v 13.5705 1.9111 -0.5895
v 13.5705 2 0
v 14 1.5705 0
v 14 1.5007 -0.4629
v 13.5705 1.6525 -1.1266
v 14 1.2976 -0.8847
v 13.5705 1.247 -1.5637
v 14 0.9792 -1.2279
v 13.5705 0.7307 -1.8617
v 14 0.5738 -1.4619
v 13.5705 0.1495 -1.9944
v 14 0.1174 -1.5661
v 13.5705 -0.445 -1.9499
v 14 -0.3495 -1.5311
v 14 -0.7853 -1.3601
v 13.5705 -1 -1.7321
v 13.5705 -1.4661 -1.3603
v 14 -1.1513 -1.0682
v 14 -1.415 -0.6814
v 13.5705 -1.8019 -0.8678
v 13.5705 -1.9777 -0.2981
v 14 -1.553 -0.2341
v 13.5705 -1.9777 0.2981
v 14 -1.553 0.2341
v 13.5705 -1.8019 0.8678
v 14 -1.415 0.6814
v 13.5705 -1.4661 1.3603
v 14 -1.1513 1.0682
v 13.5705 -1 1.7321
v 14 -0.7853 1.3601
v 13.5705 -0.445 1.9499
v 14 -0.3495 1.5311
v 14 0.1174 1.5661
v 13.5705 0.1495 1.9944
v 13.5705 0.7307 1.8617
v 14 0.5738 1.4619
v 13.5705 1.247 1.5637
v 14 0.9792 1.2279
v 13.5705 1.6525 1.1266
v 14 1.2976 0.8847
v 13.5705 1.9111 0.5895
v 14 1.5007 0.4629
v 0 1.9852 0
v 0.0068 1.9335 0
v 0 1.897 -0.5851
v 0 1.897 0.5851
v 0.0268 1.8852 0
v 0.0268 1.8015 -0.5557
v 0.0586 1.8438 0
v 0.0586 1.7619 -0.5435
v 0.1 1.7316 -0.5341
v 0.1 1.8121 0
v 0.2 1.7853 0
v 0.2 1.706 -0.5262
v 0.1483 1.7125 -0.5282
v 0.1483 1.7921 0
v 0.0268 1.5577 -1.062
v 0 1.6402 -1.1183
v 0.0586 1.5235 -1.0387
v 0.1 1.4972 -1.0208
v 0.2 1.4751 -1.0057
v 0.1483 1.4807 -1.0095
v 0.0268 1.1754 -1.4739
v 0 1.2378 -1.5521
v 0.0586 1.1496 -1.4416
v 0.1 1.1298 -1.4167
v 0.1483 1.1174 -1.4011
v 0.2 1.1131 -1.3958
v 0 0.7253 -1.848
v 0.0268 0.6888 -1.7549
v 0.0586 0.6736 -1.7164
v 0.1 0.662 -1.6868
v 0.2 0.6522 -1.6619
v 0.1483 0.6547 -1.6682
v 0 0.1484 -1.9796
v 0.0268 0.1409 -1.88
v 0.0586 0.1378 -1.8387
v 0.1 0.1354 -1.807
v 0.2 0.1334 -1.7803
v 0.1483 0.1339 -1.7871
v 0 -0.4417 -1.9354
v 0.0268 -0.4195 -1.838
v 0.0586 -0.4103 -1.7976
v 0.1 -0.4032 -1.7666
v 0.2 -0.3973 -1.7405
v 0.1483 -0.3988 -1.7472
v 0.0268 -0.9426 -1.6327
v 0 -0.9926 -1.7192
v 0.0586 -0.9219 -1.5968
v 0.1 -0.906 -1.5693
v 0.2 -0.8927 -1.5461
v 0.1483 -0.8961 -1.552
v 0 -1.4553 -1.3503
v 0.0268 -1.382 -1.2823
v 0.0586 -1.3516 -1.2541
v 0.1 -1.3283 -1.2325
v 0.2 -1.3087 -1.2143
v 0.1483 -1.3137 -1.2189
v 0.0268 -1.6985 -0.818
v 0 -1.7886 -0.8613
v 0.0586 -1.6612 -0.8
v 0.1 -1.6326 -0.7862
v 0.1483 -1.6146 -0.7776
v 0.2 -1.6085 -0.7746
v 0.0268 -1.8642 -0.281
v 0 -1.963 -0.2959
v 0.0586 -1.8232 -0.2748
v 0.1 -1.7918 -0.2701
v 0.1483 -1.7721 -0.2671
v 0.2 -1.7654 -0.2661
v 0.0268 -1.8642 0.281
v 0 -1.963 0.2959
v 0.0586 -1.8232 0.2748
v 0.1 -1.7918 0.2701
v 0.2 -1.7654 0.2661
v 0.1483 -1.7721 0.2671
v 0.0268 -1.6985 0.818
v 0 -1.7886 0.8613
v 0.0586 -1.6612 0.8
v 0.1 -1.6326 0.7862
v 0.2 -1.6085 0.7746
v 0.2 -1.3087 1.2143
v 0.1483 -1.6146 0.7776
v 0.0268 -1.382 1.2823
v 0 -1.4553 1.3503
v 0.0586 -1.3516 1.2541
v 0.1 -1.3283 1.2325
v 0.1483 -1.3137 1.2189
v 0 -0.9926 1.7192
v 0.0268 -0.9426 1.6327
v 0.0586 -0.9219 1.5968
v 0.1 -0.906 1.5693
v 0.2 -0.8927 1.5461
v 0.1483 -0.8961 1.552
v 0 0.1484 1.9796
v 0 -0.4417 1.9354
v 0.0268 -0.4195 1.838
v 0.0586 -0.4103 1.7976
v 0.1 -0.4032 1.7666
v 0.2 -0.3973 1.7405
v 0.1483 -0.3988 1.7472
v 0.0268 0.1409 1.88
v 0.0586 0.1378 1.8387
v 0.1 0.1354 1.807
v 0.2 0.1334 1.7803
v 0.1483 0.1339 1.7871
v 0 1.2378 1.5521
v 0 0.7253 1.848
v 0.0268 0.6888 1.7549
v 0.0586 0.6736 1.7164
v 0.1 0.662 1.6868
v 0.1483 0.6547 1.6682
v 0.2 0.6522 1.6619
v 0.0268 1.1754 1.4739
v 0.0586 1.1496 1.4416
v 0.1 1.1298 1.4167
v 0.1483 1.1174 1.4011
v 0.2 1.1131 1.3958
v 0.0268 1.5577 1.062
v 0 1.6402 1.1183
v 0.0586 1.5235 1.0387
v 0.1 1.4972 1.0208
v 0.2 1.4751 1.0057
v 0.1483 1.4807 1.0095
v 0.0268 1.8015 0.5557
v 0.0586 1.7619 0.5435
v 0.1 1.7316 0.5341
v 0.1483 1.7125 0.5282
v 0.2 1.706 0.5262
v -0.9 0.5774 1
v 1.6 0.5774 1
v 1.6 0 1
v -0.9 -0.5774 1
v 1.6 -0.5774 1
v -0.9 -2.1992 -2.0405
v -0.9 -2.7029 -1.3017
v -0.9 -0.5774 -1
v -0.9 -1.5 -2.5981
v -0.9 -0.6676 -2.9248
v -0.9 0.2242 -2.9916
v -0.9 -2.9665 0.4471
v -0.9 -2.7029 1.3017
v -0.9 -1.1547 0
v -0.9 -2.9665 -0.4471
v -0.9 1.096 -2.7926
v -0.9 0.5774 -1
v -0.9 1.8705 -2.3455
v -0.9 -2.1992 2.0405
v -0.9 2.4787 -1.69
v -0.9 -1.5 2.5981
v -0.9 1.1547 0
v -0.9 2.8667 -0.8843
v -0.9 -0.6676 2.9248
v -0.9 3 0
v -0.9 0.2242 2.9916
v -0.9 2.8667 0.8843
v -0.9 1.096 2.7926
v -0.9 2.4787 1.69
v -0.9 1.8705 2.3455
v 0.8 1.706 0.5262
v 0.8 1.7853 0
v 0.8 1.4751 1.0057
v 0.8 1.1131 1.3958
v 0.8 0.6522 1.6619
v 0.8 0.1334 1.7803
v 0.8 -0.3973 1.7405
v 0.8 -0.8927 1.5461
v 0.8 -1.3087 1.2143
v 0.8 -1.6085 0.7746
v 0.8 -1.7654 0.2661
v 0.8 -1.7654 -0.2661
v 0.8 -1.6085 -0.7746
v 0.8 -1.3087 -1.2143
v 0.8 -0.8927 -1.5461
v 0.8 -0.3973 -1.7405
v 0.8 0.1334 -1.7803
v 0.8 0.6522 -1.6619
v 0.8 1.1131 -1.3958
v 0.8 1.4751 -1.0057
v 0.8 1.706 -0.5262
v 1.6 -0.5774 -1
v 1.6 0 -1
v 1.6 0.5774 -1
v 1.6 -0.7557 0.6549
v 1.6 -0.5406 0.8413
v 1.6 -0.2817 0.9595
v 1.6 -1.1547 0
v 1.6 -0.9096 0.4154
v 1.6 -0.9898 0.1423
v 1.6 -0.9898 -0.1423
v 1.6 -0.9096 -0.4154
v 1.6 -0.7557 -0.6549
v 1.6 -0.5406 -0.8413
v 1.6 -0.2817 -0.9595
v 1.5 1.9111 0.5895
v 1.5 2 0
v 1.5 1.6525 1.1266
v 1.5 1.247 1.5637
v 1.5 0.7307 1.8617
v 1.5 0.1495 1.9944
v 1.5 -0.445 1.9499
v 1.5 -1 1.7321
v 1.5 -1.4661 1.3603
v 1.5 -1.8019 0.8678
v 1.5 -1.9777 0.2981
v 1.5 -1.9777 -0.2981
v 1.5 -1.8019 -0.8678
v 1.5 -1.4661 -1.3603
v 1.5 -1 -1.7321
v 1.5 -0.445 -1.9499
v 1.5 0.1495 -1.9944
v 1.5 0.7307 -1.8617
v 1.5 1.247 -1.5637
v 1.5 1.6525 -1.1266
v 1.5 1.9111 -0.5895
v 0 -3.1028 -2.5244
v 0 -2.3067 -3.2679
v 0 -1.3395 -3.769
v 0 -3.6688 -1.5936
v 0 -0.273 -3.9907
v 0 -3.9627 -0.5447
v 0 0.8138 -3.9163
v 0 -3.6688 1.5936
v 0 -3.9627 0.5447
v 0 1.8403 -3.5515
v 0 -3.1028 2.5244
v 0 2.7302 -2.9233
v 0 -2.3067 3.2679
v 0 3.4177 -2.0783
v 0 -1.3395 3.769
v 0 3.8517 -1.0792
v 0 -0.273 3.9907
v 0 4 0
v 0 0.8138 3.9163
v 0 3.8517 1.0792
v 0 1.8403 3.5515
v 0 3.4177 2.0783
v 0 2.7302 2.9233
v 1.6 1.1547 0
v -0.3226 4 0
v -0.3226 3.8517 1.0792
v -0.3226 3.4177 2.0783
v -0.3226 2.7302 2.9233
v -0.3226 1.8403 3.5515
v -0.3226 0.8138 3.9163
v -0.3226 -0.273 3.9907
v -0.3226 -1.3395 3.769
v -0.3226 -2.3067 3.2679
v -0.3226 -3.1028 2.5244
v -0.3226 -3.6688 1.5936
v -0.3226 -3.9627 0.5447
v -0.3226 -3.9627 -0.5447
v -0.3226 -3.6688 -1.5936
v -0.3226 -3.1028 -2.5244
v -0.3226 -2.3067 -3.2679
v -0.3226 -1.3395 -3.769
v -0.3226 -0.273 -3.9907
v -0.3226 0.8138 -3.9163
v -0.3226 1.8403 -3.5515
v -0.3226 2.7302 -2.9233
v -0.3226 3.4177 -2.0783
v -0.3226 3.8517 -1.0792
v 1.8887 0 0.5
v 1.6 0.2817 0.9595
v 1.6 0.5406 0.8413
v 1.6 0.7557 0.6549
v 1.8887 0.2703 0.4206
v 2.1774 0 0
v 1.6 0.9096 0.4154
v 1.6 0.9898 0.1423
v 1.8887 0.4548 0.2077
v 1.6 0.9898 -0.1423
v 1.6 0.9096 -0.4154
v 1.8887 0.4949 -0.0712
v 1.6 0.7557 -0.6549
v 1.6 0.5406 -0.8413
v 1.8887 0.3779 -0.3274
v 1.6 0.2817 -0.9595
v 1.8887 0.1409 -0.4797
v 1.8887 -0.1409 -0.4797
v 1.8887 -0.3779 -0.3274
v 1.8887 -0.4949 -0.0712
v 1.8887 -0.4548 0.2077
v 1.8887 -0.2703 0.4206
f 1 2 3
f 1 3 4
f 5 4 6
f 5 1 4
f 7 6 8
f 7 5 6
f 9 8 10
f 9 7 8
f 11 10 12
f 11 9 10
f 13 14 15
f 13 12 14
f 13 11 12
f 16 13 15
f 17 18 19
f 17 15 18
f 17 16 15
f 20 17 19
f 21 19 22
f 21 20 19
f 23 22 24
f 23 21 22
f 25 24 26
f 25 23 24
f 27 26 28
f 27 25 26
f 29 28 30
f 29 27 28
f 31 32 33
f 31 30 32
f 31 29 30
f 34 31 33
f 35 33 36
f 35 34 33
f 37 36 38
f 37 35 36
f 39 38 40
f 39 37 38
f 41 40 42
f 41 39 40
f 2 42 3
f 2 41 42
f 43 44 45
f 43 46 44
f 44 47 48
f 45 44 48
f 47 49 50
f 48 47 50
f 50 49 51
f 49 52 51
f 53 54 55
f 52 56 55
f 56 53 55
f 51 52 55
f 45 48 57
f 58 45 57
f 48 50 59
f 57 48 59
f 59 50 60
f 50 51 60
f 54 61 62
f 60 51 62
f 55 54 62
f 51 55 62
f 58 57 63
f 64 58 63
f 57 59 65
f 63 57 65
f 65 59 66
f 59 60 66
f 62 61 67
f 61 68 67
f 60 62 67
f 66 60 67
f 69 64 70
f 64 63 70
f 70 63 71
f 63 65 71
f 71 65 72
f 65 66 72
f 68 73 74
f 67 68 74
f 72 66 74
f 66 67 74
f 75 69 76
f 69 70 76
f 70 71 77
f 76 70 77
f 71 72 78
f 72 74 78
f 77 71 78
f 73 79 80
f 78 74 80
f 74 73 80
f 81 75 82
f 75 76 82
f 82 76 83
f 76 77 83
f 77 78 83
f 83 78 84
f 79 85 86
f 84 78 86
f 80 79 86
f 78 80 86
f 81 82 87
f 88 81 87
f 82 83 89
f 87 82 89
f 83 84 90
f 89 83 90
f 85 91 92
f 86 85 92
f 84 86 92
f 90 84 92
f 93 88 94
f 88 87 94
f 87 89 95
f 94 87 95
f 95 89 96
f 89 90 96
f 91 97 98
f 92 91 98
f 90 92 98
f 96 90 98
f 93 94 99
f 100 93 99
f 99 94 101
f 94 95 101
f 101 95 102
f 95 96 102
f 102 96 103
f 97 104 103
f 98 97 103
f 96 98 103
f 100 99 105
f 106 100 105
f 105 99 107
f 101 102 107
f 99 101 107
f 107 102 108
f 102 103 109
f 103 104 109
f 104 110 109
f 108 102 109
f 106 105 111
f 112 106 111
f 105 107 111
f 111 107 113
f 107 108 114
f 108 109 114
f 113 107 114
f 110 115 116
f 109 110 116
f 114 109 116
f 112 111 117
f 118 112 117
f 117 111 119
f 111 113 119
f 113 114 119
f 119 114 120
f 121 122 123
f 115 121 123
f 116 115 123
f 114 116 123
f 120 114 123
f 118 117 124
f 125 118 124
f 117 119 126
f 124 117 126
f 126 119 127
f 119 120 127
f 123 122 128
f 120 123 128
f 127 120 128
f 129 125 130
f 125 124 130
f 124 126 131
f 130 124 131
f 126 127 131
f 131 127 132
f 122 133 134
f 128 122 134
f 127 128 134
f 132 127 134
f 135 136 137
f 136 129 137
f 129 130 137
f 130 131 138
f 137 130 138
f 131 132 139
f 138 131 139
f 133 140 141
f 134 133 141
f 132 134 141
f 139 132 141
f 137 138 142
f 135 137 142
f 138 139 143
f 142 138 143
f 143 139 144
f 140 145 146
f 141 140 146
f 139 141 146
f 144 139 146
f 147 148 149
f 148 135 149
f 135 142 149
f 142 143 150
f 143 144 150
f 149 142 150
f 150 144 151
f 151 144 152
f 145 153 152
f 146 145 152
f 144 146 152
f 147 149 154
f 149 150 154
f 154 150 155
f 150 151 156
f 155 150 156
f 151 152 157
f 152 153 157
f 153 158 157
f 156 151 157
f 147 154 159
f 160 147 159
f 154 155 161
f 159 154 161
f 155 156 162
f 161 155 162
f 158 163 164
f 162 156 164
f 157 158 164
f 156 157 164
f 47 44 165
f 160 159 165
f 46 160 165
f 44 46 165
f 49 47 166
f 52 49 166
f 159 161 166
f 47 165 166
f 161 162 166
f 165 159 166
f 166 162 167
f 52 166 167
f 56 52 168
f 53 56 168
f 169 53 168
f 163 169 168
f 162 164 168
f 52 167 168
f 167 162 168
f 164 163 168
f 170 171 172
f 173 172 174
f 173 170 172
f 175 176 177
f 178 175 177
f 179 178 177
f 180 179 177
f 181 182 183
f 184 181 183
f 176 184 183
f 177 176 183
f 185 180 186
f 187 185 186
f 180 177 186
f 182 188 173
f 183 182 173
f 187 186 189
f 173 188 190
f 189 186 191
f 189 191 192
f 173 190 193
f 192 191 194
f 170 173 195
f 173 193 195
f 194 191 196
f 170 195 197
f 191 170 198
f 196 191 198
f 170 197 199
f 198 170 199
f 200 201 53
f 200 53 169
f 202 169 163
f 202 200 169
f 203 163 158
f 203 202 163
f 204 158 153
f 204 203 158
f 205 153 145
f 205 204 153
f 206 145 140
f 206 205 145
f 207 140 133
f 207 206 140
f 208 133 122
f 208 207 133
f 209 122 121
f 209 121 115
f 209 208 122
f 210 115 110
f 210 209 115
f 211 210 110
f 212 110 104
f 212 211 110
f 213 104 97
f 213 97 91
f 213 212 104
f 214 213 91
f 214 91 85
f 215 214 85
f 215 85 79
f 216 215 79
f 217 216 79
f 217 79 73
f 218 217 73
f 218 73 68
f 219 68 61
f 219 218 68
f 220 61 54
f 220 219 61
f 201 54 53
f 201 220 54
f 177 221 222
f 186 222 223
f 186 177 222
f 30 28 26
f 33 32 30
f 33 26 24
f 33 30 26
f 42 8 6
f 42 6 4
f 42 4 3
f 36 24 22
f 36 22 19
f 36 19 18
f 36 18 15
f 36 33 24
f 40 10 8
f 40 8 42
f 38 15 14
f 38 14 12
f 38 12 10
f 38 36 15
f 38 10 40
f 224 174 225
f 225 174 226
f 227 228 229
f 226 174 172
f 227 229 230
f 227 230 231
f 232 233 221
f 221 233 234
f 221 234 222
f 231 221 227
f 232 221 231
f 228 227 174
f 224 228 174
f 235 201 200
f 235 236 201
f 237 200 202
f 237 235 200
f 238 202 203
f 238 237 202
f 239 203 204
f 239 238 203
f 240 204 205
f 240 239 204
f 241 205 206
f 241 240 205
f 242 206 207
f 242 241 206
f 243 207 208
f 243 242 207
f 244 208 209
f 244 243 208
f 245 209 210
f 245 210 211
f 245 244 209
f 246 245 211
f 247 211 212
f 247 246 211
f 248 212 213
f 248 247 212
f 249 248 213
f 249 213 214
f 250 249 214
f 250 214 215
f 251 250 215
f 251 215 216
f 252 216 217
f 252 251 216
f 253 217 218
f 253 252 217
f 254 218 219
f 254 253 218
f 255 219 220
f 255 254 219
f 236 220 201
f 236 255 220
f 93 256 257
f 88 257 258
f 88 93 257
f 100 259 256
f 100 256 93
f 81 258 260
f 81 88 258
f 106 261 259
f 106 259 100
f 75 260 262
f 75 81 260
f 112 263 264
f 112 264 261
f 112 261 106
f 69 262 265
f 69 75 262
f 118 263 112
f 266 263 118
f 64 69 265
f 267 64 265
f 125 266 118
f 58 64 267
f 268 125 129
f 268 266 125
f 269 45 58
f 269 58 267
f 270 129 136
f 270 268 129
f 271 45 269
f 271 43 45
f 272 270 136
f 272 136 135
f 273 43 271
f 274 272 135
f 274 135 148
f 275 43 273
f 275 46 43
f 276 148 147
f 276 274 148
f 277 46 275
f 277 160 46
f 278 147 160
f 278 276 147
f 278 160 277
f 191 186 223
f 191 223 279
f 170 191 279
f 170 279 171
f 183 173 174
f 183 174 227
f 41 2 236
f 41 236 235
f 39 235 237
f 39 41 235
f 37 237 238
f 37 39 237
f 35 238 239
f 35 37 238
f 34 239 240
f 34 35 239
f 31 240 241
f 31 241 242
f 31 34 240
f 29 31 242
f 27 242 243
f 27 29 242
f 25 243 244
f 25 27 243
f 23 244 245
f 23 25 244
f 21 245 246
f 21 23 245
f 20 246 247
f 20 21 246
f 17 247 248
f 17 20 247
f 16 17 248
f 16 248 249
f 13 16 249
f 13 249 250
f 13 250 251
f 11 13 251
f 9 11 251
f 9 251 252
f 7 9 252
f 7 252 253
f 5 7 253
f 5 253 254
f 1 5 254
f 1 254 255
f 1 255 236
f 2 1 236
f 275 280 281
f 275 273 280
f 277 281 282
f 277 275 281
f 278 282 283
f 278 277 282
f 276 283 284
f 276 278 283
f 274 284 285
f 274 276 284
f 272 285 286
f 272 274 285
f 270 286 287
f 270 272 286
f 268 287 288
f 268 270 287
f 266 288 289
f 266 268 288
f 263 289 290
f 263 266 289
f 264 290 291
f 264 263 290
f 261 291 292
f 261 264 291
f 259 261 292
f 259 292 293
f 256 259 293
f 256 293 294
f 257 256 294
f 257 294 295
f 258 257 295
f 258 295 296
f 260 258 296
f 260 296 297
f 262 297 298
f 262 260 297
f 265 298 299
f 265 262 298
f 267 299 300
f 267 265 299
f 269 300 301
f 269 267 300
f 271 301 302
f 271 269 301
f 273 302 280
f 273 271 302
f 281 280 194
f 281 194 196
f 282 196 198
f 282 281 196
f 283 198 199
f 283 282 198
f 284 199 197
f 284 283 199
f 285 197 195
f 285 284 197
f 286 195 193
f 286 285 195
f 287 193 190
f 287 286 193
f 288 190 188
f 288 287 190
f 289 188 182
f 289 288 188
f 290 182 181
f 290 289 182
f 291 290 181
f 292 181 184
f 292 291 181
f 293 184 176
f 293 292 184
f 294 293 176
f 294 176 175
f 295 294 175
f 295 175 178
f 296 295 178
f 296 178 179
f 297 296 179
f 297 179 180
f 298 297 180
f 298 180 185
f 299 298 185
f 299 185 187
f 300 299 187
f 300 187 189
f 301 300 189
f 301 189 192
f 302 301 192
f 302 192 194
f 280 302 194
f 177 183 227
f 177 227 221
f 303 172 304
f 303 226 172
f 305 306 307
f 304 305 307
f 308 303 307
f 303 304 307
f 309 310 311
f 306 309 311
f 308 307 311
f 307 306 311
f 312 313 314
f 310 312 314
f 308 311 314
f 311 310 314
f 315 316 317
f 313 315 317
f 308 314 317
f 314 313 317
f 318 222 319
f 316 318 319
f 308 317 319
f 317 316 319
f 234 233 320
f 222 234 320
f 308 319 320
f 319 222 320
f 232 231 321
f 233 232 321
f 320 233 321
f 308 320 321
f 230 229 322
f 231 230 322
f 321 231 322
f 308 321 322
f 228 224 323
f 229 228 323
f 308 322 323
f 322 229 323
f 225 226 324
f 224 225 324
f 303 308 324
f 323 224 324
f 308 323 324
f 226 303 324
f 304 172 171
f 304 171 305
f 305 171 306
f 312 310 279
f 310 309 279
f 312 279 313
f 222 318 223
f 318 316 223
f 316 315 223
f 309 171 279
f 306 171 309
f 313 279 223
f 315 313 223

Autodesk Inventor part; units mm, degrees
ref_plane "YZ Plane" through (0, 0, 0) normal (1, 0, 0) x (0, 1, 0)
ref_plane "XZ Plane" through (0, 0, 0) normal (0, 1, 0) x (-1, 0, 0)
ref_plane "XY Plane" through (0, 0, 0) normal (0, 0, 1) x (1, 0, 0)
sketch "Sketch_1" plane through (0, 0, 0) normal (0, 0, 1) x (1, 0, 0)
  line L0 (14, 0) -> (-0.9, 0)
  line L1 (-0.9, 0) -> (-0.9, 3)
  line L2 (-0.9, 3) -> (-0.3226, 4)
  line L3 (-0.3226, 4) -> (0, 4)
  line L4 (0, 4) -> (0, 1.9852)
  arc A0 (0, 1.9852) -> (0.2, 1.7853) centre (0.2, 1.9853) ccw
  line L5 (0.2, 1.7853) -> (0.8, 1.7853)
  line L6 (0.8, 1.7853) -> (1.5, 2)
  line L7 (1.5, 2) -> (13.5705, 2)
  line L8 (13.5705, 2) -> (14, 1.5705)
  line L9 (14, 1.5705) -> (14, 0)
  line L10 (14, 0) -> (-0.9, 0)
revolve "Revolution1" add sketch "Sketch_1" angle 360 about axis through (14, 0, 0) along (1, 0, 0)
thread "Thread1" size "M4x0.7" class "6g" standard "ISO Metric profile" full length
sketch "Sketch2" plane through (-0.9, 0, 0) normal (-1, 0, 0) x (0, 0, 1)
  point P0 (0, 0)
hole "Hole1" at (-0.9, 0, 0) direction (1, 0, 0) diameter 2 depth 2.5 tip angle 120
sketch "Sketch_3" plane through (-0.9, 0, 0) normal (1, 0, 0) x (0, 0, -1)
  line L0 (-1, -0.5774) -> (0, -1.1547)
  line L1 (0, -1.1547) -> (1, -0.5774)
  line L2 (1, -0.5774) -> (1, 0.5774)
  line L3 (1, 0.5774) -> (0, 1.1547)
  line L4 (0, 1.1547) -> (-1, 0.5774)
  line L5 (-1, 0.5774) -> (-1, -0.5774)
extrude "Extrusion1" cut sketch "Sketch_3" along normal blind 2.5
properties part number "CBSTSR4-14" material "鋼、炭素鋼"
